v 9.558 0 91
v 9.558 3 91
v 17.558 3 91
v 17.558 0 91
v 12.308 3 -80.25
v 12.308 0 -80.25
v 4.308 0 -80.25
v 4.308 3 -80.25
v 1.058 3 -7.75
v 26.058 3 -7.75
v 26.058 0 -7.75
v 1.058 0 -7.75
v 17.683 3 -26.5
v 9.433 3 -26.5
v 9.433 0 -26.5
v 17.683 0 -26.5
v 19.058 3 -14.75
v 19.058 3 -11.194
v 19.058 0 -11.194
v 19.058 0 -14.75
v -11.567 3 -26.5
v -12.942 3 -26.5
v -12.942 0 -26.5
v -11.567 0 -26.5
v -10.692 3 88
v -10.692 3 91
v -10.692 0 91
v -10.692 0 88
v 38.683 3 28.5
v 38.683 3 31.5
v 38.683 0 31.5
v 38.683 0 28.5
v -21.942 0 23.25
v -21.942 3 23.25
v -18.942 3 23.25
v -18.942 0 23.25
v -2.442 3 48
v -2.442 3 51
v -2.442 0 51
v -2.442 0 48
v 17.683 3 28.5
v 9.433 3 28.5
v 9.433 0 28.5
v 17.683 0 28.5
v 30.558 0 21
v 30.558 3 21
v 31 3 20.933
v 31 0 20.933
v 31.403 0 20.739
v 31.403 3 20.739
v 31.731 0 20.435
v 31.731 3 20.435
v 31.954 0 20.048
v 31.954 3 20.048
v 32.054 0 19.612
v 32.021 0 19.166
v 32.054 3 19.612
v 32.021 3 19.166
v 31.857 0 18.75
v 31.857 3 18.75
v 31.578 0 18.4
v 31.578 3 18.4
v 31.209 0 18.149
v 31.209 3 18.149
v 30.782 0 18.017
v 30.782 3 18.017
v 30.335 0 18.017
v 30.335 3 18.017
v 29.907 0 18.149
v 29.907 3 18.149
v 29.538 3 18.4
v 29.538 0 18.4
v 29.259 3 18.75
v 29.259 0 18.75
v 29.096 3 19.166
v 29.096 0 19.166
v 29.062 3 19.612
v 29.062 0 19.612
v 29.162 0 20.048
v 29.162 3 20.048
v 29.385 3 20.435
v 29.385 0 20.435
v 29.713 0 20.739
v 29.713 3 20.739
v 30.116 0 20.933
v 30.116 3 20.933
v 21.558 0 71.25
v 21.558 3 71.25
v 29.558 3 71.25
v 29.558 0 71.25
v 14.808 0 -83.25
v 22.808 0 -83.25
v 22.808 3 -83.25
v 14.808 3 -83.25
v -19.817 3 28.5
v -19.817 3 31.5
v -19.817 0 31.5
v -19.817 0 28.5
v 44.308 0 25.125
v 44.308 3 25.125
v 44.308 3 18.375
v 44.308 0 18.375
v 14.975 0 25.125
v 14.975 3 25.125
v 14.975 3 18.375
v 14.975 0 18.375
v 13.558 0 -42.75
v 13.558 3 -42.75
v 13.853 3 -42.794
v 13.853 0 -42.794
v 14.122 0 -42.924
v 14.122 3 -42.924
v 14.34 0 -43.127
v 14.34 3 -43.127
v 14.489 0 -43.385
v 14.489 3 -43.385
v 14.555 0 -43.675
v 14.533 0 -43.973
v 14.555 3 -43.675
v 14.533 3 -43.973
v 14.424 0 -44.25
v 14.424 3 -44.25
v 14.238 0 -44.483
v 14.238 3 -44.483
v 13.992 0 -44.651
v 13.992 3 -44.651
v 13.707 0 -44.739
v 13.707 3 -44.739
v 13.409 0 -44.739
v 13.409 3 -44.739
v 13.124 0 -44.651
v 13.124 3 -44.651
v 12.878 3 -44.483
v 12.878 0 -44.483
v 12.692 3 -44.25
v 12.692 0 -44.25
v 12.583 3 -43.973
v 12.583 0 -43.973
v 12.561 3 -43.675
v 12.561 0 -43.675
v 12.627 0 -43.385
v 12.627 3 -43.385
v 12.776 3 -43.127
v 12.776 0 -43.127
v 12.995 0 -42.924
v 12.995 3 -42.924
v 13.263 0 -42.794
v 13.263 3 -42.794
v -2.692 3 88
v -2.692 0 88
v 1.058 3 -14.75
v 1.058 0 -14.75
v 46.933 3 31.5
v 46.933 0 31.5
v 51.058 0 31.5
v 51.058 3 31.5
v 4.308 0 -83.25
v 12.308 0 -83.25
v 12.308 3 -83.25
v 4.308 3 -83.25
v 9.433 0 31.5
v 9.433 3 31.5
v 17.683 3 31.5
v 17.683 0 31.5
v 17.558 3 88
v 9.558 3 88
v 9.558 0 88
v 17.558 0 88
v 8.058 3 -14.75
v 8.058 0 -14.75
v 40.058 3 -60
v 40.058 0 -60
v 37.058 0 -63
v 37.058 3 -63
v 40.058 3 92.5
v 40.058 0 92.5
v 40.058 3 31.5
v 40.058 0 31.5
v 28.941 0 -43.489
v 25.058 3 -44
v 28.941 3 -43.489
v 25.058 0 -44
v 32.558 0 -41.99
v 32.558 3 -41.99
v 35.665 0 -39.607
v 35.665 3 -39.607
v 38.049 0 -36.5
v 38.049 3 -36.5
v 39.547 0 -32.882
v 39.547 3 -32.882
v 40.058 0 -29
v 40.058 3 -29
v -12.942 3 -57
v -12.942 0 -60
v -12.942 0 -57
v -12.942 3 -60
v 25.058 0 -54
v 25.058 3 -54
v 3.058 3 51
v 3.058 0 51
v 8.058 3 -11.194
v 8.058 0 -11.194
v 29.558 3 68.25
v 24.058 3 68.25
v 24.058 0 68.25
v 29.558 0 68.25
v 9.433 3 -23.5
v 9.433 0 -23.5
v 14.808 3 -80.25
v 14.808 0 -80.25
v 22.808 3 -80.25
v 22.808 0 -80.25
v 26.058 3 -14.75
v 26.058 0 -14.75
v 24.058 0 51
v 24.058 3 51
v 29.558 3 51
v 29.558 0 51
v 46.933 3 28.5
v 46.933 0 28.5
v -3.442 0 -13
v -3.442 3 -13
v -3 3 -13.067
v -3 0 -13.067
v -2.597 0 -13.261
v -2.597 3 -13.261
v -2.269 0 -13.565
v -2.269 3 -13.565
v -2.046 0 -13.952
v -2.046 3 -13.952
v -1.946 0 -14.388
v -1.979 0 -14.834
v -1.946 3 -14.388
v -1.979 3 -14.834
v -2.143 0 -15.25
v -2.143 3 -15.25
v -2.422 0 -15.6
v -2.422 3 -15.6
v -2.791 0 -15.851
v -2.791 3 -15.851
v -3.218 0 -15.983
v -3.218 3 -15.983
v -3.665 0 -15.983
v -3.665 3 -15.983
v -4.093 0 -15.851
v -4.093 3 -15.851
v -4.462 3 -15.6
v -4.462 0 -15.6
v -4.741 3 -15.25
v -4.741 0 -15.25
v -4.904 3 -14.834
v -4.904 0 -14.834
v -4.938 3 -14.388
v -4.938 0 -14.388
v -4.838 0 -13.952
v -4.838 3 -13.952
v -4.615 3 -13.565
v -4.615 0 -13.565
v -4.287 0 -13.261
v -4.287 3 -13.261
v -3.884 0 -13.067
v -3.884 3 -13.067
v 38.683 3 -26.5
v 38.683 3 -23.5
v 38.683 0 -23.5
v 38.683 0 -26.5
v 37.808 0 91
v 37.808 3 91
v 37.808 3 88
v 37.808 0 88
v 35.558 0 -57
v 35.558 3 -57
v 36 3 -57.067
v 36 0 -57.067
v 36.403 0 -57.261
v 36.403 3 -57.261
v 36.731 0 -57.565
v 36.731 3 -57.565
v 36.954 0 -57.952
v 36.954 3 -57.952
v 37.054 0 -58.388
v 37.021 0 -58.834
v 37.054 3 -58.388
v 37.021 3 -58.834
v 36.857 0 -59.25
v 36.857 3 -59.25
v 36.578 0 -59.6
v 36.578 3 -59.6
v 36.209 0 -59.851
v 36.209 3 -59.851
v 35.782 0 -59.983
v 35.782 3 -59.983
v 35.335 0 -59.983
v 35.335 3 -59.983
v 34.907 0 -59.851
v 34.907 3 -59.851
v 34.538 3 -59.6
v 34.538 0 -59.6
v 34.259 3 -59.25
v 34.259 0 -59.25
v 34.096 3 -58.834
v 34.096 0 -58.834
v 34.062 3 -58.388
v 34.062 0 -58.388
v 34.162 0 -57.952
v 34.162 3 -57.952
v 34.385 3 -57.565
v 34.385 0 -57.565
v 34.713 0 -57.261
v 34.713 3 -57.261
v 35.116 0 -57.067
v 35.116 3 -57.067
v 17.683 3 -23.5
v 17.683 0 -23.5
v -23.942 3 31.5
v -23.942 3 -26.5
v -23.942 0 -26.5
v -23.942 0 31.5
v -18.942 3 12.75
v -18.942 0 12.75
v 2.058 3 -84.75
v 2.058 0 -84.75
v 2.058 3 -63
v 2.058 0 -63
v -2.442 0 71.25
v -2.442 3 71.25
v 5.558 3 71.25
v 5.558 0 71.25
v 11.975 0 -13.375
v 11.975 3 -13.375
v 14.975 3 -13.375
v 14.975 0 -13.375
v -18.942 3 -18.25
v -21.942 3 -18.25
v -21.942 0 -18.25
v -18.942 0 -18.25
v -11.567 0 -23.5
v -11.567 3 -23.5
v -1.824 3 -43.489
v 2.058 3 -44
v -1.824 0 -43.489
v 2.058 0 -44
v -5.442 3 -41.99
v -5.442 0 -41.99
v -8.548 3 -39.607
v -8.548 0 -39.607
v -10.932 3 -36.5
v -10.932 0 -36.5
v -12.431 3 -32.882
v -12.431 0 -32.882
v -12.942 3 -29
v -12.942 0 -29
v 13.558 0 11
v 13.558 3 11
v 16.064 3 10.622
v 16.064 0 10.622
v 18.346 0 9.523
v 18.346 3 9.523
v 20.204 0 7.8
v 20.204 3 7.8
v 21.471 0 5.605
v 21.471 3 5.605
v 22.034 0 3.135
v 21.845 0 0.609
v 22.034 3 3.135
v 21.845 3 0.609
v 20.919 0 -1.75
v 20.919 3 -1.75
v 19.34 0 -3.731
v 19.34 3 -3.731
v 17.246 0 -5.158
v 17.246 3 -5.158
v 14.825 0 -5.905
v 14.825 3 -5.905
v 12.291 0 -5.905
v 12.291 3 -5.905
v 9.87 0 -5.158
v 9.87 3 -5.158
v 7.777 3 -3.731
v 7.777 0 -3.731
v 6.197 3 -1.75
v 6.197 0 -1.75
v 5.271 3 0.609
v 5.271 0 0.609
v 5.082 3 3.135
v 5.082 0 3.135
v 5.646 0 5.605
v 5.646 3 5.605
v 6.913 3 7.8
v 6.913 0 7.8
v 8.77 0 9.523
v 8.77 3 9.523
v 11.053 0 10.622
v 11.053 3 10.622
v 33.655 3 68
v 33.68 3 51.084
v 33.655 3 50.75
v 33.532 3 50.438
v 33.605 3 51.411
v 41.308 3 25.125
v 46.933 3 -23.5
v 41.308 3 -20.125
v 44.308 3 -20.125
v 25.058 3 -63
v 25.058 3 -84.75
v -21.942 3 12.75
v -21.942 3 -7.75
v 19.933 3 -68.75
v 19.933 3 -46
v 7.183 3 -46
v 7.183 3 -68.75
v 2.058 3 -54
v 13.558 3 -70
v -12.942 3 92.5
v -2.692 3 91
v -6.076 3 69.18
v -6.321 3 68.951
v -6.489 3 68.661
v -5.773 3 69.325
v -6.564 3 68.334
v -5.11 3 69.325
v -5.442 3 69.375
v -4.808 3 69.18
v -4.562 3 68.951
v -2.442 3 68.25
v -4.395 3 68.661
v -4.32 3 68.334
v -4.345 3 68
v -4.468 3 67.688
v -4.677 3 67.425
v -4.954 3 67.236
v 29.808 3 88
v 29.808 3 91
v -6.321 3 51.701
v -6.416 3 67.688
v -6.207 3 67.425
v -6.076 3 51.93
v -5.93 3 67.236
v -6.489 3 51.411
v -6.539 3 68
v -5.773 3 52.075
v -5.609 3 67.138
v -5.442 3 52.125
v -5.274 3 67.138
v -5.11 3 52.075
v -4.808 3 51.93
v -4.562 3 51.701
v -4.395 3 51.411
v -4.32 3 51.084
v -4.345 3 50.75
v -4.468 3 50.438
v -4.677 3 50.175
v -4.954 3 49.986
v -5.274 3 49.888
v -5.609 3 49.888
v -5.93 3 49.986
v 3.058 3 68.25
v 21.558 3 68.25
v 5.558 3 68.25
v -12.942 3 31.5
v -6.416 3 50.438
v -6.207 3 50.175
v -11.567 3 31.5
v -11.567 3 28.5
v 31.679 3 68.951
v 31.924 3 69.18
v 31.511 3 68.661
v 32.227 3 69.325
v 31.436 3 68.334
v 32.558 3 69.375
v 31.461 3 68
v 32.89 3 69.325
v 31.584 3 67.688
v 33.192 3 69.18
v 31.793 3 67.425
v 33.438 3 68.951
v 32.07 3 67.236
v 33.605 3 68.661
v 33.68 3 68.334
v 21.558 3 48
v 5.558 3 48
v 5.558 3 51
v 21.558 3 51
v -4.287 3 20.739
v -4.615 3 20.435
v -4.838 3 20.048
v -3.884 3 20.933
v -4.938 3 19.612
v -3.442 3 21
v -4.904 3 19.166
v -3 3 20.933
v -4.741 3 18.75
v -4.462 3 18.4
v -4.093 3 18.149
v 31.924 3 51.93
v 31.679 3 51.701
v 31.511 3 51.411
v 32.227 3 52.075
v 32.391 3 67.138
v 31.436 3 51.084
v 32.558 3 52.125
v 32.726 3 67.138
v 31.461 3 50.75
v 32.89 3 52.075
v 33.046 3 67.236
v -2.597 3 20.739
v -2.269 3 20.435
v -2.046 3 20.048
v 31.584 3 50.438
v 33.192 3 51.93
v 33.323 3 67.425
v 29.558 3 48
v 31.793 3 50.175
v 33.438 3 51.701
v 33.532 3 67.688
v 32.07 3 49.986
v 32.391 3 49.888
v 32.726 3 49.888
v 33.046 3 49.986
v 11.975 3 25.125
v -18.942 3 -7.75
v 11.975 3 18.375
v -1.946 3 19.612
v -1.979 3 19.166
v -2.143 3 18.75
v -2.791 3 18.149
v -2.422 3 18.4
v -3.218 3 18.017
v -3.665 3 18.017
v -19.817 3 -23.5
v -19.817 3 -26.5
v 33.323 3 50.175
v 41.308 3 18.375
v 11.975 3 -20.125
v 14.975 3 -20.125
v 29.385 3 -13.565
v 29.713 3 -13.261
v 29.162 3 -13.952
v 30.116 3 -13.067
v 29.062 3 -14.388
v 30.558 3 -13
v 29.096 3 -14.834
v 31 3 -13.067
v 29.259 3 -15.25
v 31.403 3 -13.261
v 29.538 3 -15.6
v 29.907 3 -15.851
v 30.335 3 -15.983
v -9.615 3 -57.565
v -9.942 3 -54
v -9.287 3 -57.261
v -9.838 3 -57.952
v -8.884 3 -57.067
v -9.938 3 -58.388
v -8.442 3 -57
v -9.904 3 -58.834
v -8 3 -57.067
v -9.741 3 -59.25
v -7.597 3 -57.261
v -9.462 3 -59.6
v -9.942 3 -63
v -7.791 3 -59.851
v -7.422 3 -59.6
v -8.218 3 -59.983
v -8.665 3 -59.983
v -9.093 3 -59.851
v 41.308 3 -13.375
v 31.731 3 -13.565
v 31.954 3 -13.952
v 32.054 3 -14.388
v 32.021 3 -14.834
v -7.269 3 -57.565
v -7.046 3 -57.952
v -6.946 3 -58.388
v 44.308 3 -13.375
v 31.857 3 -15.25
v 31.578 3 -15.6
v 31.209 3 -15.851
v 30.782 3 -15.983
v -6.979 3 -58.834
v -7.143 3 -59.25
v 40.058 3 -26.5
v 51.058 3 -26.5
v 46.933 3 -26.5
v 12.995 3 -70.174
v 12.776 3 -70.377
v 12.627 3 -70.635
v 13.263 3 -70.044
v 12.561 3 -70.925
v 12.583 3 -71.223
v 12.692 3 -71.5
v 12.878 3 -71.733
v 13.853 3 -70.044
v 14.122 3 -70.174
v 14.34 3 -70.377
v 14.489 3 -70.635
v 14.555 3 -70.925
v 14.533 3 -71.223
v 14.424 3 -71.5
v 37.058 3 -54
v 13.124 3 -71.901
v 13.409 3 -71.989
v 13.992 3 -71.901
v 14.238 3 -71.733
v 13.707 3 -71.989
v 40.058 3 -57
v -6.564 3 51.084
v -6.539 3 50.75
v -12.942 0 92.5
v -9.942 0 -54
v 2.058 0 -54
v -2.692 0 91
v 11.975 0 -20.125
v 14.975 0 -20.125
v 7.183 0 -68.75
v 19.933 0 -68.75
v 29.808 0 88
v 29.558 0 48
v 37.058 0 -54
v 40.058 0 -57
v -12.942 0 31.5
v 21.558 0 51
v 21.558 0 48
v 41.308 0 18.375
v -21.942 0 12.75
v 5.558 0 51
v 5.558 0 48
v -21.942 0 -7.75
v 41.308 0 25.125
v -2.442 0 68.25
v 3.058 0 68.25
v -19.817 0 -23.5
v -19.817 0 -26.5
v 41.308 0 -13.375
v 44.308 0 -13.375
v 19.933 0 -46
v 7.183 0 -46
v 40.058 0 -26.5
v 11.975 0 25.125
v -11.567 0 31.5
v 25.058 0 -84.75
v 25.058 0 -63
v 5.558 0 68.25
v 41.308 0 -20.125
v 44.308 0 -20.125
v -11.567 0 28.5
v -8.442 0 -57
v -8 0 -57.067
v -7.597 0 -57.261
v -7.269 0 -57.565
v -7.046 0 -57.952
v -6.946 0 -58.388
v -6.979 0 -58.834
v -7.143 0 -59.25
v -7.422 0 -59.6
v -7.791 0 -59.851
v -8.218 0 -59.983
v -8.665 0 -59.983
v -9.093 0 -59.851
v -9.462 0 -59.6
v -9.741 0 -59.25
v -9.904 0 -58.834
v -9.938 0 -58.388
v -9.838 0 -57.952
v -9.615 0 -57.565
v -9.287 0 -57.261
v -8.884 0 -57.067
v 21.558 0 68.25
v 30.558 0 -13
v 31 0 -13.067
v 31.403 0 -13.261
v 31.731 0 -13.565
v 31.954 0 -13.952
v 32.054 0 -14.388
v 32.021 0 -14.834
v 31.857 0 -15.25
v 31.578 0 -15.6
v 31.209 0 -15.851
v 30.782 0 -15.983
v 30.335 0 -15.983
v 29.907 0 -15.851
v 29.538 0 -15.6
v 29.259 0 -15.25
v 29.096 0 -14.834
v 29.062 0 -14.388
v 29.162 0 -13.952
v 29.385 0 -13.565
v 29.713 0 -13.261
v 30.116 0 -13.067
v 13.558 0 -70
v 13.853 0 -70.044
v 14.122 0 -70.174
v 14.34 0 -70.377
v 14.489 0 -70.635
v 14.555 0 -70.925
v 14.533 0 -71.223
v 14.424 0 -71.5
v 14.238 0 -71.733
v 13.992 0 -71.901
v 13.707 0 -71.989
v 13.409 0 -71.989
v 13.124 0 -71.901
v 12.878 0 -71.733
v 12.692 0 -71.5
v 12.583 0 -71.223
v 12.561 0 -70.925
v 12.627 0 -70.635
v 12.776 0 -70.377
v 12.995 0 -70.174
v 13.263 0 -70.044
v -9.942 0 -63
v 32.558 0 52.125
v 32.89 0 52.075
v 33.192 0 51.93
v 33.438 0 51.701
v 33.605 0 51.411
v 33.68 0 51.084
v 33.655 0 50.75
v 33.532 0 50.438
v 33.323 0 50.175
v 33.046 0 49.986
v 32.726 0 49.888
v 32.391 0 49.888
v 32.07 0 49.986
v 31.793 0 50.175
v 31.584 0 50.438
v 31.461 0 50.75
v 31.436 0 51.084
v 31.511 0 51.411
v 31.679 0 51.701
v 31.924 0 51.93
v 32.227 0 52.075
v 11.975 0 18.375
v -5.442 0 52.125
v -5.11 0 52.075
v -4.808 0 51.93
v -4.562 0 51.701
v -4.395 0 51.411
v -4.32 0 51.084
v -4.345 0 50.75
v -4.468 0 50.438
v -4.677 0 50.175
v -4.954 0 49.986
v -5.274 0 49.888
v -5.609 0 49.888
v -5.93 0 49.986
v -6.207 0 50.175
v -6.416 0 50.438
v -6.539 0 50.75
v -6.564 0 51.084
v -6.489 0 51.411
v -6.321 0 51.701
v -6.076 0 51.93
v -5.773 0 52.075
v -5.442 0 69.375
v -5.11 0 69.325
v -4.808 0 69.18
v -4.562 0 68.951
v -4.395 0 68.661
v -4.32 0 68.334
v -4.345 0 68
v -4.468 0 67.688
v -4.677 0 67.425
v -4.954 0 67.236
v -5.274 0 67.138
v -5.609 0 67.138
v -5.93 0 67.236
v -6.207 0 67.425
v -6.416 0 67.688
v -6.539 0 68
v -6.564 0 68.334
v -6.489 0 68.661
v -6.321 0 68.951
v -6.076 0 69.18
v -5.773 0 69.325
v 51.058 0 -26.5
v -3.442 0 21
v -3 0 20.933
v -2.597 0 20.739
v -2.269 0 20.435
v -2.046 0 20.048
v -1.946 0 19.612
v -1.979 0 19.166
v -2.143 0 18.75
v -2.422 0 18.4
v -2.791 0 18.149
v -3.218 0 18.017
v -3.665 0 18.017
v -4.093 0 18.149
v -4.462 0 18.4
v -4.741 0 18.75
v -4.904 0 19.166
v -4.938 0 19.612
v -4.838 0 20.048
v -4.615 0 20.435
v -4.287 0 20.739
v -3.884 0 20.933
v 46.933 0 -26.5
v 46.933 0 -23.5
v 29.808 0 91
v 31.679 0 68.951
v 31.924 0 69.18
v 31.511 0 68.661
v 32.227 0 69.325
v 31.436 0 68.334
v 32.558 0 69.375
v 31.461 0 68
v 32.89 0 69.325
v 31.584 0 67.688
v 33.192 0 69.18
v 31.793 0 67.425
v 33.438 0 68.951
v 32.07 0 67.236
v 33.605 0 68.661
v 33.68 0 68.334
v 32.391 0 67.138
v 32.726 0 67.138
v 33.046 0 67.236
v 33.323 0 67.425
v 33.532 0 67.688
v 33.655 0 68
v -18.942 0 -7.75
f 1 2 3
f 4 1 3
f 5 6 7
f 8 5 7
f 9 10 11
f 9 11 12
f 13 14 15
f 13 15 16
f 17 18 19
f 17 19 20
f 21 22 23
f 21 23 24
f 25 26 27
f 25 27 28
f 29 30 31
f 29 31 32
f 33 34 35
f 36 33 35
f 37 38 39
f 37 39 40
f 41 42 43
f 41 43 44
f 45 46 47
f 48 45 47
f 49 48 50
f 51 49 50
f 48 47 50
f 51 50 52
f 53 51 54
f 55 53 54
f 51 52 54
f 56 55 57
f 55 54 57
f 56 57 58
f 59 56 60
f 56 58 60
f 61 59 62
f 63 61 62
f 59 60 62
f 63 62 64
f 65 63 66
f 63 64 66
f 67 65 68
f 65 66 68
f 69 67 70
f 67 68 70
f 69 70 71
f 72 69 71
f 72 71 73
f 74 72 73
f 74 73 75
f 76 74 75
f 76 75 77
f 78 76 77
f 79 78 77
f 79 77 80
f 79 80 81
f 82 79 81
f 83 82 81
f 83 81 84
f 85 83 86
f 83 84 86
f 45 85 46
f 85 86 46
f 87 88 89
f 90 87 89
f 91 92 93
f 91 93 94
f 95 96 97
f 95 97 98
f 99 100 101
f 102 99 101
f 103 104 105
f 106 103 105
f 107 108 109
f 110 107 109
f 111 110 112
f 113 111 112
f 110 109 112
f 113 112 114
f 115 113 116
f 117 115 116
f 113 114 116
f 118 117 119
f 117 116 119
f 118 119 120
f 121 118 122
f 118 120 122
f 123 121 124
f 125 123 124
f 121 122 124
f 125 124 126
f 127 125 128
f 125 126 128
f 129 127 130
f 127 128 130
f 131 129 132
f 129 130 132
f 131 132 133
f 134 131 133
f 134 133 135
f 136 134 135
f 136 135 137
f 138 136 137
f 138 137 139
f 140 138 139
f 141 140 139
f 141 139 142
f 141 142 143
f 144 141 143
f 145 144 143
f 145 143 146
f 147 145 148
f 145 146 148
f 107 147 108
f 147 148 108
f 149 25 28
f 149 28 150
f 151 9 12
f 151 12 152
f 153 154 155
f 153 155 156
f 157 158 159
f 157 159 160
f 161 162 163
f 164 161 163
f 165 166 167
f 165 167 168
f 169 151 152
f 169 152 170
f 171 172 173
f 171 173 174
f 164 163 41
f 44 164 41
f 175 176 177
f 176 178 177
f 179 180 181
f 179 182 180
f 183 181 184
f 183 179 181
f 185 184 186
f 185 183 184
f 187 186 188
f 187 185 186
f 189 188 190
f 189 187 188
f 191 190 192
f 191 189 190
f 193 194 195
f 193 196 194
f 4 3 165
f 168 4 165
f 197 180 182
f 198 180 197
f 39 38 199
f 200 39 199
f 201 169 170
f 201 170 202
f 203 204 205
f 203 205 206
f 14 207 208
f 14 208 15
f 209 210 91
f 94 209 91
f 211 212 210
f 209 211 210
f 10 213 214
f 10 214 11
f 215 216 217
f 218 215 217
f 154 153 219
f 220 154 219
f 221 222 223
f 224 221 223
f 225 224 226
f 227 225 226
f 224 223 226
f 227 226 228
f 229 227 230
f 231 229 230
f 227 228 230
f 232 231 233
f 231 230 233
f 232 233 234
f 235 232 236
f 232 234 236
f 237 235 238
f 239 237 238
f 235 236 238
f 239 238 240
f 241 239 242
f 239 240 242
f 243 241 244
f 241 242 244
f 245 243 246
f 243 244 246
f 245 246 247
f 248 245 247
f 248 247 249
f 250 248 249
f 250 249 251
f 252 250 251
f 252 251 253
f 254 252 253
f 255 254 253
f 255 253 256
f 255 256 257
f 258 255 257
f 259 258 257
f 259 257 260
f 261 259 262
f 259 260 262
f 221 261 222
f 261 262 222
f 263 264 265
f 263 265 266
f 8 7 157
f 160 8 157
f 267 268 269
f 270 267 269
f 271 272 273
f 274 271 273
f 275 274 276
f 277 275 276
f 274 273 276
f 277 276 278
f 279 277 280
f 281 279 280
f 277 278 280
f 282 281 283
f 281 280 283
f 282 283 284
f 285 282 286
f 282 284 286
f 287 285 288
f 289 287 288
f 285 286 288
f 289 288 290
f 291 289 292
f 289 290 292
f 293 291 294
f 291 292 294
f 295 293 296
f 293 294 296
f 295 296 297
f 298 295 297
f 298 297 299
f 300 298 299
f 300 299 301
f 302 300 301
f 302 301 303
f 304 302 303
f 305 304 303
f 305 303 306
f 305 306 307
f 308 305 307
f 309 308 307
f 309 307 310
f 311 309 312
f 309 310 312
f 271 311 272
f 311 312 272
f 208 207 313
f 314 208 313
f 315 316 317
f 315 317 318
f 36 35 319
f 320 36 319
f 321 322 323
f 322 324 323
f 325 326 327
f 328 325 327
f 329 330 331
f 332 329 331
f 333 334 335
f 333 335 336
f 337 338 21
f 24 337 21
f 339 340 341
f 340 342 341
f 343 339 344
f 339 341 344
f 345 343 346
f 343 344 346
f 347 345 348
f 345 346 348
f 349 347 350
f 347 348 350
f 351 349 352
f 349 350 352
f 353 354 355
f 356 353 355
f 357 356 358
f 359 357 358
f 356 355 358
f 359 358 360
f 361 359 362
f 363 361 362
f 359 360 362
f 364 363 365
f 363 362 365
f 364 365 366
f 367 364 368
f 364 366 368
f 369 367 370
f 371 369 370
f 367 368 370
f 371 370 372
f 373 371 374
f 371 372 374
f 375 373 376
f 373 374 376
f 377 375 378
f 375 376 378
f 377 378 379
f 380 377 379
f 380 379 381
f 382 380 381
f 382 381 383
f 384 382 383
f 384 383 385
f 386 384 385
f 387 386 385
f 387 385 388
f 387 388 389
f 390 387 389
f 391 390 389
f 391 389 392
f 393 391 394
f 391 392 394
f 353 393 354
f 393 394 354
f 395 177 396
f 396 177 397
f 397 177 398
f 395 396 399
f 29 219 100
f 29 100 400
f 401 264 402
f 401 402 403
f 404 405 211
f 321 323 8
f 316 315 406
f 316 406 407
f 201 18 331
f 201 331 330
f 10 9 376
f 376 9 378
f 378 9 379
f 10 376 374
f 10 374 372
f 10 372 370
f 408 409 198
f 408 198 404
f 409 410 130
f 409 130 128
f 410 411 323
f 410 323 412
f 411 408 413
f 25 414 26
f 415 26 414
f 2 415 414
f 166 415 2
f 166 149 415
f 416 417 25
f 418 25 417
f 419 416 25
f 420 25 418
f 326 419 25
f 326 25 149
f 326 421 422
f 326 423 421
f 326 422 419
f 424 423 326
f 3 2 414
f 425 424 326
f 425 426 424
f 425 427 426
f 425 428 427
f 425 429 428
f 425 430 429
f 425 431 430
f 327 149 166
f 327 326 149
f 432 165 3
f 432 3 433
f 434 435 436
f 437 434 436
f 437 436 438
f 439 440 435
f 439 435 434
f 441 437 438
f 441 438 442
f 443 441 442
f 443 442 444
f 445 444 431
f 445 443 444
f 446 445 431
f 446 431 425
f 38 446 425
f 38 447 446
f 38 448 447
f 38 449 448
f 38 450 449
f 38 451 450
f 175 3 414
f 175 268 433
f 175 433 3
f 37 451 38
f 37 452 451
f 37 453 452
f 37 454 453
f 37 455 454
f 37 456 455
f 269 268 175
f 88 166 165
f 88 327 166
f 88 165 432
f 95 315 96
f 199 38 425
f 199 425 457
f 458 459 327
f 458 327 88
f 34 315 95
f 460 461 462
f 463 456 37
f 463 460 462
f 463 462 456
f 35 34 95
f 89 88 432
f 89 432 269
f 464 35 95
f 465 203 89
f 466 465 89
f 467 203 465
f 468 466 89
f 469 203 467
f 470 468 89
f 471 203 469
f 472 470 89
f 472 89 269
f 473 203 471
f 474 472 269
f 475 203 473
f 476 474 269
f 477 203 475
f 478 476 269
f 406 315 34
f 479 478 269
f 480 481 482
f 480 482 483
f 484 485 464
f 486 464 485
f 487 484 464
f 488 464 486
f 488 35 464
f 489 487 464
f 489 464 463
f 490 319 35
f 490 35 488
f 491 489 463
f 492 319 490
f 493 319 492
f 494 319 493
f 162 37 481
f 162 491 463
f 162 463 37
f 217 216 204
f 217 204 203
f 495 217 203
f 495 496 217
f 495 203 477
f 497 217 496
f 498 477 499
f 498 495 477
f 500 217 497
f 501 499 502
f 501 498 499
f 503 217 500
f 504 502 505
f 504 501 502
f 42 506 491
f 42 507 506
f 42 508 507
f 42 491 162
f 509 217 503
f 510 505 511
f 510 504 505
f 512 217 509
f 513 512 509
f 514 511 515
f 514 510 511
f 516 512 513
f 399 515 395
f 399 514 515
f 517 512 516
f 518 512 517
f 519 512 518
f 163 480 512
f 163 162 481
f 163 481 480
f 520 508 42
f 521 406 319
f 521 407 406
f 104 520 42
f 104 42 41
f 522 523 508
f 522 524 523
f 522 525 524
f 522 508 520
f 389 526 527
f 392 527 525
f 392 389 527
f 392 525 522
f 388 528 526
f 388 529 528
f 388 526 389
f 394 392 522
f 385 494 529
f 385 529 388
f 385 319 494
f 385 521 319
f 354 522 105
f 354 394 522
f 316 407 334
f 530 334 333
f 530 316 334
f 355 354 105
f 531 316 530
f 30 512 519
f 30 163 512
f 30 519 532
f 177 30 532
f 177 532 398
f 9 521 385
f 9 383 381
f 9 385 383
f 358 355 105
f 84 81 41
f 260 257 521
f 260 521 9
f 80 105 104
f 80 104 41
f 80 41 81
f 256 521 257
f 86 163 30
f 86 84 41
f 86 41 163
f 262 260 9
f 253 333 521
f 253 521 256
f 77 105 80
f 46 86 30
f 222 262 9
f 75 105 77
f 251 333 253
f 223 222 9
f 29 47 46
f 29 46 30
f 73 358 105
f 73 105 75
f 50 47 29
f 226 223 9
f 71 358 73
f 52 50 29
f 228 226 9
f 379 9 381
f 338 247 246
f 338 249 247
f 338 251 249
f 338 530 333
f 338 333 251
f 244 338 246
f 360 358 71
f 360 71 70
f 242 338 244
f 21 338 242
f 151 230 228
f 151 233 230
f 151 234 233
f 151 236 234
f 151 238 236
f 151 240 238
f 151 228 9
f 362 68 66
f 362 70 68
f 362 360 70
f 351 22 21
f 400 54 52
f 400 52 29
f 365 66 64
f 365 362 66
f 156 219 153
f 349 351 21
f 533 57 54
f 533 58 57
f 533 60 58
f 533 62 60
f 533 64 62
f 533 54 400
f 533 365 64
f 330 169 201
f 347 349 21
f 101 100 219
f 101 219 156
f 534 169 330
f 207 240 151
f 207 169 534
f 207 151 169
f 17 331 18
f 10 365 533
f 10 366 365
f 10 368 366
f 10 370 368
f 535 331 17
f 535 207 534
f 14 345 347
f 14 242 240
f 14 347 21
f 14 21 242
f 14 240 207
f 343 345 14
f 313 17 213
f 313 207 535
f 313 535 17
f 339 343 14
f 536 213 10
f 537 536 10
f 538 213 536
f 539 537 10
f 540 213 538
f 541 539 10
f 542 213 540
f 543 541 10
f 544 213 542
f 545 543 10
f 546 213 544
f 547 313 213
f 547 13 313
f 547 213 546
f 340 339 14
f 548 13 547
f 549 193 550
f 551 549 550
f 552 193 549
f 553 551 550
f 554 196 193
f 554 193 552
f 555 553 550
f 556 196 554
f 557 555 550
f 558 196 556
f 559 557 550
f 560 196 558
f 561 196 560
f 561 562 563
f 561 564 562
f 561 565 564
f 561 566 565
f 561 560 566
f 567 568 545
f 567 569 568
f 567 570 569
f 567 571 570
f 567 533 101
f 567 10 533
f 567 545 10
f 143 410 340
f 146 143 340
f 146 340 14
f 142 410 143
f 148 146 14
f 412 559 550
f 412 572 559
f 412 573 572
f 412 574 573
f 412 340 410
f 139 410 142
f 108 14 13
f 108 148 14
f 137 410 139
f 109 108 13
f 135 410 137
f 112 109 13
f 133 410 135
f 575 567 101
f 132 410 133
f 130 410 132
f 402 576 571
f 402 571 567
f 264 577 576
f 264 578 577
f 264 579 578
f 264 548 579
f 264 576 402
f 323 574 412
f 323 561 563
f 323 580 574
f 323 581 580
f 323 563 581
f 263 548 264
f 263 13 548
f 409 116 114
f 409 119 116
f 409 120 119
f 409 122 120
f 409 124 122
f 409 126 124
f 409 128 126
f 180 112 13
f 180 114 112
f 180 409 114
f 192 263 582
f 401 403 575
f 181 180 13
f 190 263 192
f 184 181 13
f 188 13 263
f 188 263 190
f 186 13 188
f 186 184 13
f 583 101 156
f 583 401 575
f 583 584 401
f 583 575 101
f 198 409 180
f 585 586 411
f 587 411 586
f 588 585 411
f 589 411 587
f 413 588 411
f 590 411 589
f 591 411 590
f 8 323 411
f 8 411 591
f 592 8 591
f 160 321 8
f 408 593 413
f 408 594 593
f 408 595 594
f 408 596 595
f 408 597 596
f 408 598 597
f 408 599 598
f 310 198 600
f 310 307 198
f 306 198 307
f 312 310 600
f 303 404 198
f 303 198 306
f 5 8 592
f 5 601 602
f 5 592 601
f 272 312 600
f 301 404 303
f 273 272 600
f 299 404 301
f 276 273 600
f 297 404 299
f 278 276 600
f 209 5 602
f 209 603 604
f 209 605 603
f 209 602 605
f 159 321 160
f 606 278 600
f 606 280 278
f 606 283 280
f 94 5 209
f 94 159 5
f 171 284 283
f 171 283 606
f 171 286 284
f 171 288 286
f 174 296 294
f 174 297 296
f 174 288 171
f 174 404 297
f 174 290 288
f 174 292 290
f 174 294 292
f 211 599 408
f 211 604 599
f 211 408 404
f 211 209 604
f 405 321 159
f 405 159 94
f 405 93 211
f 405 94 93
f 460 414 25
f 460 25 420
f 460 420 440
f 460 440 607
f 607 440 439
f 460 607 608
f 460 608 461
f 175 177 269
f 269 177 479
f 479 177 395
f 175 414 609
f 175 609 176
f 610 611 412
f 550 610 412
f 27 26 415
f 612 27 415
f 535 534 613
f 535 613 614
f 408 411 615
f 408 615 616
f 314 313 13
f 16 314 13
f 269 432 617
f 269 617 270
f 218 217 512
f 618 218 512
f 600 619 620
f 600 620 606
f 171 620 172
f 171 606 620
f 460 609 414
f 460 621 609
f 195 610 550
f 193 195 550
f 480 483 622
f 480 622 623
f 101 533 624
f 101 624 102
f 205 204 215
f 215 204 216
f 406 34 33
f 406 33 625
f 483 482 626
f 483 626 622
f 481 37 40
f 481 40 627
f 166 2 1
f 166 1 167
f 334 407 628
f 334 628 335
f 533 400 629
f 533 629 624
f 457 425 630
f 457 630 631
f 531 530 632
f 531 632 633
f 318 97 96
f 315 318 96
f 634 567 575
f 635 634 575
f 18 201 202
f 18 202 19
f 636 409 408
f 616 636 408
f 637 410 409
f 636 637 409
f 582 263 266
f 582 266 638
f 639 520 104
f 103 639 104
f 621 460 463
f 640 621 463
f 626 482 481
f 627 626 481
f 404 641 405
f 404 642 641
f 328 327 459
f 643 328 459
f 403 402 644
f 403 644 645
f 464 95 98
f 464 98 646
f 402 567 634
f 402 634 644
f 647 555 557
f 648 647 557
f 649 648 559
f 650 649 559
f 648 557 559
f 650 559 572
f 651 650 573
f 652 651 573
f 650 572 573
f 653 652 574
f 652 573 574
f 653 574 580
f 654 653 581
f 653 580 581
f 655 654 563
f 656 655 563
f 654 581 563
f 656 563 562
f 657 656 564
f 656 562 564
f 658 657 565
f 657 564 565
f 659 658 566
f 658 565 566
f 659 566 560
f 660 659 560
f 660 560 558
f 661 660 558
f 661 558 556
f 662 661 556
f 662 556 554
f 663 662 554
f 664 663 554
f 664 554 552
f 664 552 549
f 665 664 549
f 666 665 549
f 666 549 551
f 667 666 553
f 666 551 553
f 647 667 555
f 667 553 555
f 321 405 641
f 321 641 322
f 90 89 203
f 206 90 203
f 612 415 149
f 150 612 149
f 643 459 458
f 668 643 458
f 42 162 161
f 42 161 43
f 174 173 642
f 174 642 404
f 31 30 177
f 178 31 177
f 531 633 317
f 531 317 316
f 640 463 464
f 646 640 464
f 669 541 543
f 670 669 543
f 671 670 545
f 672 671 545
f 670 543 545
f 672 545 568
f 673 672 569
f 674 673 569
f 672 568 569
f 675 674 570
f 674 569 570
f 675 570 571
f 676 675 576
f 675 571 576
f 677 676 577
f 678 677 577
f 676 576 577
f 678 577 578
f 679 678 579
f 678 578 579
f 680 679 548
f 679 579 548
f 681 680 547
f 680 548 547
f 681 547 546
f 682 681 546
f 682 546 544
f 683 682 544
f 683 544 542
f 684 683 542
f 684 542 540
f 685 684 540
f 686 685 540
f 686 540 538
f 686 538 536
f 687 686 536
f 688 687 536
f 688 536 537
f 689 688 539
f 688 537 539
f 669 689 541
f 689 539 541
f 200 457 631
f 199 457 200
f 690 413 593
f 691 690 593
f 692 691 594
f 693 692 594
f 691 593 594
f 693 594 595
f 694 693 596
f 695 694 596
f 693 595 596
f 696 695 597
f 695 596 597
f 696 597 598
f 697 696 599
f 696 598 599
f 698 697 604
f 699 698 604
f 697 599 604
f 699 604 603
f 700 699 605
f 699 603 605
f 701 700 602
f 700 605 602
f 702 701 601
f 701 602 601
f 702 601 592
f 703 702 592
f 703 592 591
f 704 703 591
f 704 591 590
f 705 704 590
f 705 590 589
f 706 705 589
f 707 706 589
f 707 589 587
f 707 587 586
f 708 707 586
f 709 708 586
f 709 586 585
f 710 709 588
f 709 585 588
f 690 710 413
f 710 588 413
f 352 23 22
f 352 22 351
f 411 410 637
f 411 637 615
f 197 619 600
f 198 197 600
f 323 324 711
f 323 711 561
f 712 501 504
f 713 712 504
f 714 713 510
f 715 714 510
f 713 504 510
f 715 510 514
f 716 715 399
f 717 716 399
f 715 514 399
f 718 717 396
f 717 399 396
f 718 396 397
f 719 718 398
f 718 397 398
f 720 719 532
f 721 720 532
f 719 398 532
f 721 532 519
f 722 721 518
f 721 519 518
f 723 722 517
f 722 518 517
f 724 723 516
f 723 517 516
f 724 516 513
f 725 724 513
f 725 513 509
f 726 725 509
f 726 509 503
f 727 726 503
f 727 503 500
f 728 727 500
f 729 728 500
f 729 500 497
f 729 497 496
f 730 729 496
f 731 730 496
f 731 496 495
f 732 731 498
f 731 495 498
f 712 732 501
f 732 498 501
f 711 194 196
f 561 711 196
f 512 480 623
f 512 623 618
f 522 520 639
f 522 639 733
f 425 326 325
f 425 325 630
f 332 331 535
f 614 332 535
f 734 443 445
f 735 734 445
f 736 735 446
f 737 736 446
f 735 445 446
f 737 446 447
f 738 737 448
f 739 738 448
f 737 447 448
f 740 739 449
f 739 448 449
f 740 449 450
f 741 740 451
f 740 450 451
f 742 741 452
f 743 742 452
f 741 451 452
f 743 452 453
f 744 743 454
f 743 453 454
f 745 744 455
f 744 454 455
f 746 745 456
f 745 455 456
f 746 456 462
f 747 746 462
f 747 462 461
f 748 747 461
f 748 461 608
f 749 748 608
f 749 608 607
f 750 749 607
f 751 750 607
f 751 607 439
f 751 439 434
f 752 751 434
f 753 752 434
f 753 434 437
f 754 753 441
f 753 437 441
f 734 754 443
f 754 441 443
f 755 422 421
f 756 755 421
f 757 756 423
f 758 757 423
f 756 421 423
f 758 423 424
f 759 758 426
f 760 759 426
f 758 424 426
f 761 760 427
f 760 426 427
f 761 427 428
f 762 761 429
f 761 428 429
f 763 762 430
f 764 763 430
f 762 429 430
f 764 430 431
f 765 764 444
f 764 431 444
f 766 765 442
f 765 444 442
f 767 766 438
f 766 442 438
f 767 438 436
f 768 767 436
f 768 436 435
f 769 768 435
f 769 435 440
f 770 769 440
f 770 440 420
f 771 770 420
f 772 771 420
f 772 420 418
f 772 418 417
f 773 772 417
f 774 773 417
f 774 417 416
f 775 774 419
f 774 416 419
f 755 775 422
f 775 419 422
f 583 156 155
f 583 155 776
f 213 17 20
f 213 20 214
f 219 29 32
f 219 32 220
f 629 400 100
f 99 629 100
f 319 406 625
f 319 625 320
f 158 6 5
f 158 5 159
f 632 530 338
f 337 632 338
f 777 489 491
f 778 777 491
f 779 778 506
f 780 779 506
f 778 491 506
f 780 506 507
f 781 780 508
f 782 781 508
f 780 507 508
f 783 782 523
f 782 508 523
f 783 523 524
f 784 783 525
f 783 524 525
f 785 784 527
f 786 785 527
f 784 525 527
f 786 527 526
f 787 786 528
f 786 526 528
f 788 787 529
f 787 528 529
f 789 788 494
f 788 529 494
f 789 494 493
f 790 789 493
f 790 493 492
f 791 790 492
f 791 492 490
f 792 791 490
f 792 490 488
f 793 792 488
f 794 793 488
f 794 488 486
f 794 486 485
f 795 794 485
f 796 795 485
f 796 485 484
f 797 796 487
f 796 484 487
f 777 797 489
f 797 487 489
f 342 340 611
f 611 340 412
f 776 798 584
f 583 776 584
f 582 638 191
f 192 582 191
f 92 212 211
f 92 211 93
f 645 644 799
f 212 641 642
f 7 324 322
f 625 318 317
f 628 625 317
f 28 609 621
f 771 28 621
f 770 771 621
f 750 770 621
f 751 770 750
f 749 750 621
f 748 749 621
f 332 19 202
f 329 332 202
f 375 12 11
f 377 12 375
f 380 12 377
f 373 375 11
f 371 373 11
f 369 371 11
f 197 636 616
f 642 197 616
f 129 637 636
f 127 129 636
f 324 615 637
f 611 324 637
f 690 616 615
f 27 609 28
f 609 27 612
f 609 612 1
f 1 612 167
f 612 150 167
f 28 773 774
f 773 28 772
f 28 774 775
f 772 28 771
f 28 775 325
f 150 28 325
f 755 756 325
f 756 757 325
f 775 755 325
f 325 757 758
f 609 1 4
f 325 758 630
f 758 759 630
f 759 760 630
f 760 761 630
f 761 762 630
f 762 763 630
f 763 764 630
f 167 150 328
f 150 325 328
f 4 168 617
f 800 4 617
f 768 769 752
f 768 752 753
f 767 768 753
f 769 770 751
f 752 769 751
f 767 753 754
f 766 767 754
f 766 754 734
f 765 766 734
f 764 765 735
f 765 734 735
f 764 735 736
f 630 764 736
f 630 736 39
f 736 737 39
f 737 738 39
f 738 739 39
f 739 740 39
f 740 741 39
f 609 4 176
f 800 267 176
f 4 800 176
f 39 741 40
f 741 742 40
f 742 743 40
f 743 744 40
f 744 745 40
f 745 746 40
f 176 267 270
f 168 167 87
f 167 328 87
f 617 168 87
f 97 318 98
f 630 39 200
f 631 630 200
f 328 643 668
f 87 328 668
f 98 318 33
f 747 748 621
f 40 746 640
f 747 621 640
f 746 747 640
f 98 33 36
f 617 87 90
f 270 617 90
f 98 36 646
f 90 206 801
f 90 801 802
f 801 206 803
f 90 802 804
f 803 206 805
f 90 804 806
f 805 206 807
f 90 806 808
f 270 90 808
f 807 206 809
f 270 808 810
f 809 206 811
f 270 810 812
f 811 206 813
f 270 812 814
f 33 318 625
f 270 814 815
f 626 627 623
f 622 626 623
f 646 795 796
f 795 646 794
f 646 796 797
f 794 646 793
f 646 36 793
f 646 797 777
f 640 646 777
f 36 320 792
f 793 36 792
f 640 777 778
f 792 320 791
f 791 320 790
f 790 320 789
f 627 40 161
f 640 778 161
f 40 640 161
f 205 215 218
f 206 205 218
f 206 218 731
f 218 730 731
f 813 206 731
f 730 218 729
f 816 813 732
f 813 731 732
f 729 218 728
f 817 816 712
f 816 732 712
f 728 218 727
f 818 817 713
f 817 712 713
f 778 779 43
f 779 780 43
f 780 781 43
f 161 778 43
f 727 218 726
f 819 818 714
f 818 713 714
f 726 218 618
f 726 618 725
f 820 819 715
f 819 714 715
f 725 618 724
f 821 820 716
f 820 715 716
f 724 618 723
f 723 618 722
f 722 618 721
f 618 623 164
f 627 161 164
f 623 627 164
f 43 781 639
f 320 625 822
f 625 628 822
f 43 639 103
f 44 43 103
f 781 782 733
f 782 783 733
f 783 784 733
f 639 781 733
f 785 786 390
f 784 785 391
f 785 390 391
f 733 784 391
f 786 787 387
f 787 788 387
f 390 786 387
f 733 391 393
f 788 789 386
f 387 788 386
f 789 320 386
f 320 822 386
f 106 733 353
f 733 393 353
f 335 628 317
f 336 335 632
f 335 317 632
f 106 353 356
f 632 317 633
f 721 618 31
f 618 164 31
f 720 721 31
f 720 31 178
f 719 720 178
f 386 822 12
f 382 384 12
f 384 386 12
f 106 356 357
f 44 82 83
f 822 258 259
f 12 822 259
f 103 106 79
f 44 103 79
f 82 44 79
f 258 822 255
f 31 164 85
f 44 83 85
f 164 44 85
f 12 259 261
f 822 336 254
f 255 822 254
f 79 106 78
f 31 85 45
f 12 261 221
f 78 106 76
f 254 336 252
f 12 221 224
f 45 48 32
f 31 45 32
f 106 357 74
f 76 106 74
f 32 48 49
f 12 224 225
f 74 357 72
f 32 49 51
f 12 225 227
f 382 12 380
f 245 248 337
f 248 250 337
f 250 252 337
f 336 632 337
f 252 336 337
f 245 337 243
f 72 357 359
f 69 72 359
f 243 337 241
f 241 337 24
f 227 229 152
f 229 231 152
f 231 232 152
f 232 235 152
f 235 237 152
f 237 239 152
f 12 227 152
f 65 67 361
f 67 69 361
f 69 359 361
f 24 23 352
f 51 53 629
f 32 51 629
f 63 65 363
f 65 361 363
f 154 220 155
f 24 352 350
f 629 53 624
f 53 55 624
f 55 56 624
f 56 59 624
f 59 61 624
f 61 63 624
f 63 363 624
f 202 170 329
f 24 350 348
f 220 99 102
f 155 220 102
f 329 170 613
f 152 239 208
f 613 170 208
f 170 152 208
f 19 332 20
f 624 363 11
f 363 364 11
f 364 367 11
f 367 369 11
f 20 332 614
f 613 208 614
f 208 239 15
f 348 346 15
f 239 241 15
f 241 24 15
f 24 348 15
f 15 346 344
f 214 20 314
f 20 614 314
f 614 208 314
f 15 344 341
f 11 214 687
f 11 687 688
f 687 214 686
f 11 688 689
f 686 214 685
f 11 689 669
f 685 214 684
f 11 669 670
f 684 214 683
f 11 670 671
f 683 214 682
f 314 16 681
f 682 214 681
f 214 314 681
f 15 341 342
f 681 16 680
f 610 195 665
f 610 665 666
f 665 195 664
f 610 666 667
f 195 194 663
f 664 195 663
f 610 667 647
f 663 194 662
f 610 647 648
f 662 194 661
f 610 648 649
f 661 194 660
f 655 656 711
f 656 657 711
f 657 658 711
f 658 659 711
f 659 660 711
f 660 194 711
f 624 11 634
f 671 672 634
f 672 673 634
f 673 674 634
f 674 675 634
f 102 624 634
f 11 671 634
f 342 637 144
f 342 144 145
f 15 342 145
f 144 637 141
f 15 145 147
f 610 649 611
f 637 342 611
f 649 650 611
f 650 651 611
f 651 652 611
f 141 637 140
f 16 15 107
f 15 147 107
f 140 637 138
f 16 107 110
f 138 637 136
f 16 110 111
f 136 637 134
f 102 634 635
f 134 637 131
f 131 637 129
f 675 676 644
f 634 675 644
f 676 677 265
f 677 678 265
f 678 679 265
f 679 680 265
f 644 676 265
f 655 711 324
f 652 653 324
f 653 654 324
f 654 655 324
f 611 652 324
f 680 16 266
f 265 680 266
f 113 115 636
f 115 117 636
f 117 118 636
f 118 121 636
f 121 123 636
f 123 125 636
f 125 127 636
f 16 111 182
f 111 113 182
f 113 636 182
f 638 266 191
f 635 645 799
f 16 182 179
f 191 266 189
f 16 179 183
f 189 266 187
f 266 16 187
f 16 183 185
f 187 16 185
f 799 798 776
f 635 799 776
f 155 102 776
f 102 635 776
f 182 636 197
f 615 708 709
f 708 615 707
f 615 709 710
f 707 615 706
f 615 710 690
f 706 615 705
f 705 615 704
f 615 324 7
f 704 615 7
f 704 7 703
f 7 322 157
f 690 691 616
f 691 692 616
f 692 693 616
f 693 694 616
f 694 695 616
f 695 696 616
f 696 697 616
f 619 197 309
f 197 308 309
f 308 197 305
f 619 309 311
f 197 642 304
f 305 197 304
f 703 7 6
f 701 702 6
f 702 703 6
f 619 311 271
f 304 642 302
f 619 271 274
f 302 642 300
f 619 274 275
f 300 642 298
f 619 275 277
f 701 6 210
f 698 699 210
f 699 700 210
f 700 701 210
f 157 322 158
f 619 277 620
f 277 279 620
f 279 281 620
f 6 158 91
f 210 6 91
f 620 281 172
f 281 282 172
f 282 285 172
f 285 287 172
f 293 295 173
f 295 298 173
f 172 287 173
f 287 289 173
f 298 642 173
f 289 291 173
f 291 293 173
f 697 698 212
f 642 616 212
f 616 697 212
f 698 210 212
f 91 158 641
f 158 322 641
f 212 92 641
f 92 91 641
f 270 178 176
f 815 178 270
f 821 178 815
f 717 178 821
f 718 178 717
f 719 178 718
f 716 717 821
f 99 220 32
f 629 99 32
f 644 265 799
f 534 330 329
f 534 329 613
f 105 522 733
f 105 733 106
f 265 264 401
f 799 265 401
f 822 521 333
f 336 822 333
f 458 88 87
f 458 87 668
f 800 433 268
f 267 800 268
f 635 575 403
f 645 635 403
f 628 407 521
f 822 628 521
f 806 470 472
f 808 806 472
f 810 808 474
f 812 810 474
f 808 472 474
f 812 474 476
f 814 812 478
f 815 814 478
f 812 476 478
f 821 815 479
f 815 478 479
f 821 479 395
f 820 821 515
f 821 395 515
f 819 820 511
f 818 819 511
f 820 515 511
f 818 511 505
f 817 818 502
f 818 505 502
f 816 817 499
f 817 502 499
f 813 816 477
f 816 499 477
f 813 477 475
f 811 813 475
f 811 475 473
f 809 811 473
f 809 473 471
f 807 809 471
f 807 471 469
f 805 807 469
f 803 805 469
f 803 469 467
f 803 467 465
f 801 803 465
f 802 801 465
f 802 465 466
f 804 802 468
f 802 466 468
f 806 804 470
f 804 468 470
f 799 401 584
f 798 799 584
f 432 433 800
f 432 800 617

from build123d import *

# Parameters (mm, degrees)
SKETCH1_W            = 53
SKETCH1_H            = 153
BOSS_EXTRUDE1_DEPTH  = 3
SKETCH2_R            = 1.125
CUT_EXTRUDE1_DEPTH   = 3
SKETCH4_W            = 58
SKETCH4_H            = 3
BOSS_EXTRUDE3_DEPTH  = 4.5
SKETCH5_W            = 58
SKETCH5_H            = 3
BOSS_EXTRUDE4_DEPTH  = 4.5
SKETCH8_W            = 15
SKETCH8_H            = 13.5
CUT_EXTRUDE3_DEPTH   = 3
SKETCH9_W            = 6
SKETCH9_H            = 9
CUT_EXTRUDE4_DEPTH   = 3
SKETCH10_W           = 15
SKETCH10_H           = 10
CUT_EXTRUDE5_DEPTH   = 3
SKETCH11_W           = 12.75
SKETCH11_H           = 22.75
CUT_EXTRUDE6_DEPTH   = 3
SKETCH12_R           = 1
CUT_EXTRUDE7_DEPTH   = 3
SKETCH17_W           = 9
SKETCH17_H           = 3
BOSS_EXTRUDE6_DEPTH  = 6
SKETCH18_W           = 9
SKETCH18_H           = 3
BOSS_EXTRUDE8_DEPTH  = 6
SKETCH19_R           = 1.5
CUT_EXTRUDE11_DEPTH  = 3
SKETCH20_W           = 58
SKETCH20_H           = 3
BOSS_EXTRUDE9_DEPTH  = 6.5
SKETCH21_W           = 58
SKETCH21_H           = 3
BOSS_EXTRUDE10_DEPTH = 6.5
SKETCH29_W           = 8
SKETCH29_H           = 3
CUT_EXTRUDE15_DEPTH  = 3
SKETCH33_W           = 21
SKETCH33_H           = 17.25
CUT_EXTRUDE20_DEPTH  = 3
CHAMFER1_SIZE        = 3
CHAMFER2_SIZE        = 3
CHAMFER3_SIZE        = 3
CHAMFER4_SIZE        = 3
SKETCH34_W           = 8.25
SKETCH34_H           = 3
CUT_EXTRUDE21_DEPTH  = 3
SKETCH35_W           = 3
SKETCH35_H           = 6.75
CUT_EXTRUDE22_DEPTH  = 3
SKETCH36_W           = 3
SKETCH36_H           = 6.75
CUT_EXTRUDE23_DEPTH  = 3
SKETCH37_W           = 3
SKETCH37_H           = 10.5
CUT_EXTRUDE24_DEPTH  = 3
FILLET1_R            = 15
FILLET2_R            = 15
SKETCH38_W           = 23
SKETCH38_H           = 3
BOSS_EXTRUDE12_DEPTH = 8.25
SKETCH39_W           = 8
SKETCH39_H           = 3
CUT_EXTRUDE25_DEPTH  = 3
SKETCH40_W           = 53
SKETCH40_H           = 3
BOSS_EXTRUDE13_DEPTH = 16
SKETCH41_W           = 8
SKETCH41_H           = 3
CUT_EXTRUDE26_DEPTH  = 3
SKETCH42_R           = 8.5
SKETCH42_R_2         = 1.5
CUT_EXTRUDE30_DEPTH  = 3


with BuildPart() as part:
    # Sketch1 → Boss-Extrude1 (new body)
    with BuildSketch(Plane(origin=(0, 0, 0), x_dir=(1, 0, 0), z_dir=(0, 1, 0))):
        with Locations((13.558181818, 0)):
            Rectangle(SKETCH1_W, SKETCH1_H)
    extrude(amount=BOSS_EXTRUDE1_DEPTH)

    # Sketch2 → Cut-Extrude1 (cut)
    with BuildSketch(Plane(origin=(0, 3, 0), x_dir=(1, 0, 0), z_dir=(0, 1, 0))):
        with Locations(Location((-5.441818182, -68.25, 0), (0, 0, 270))):
            Circle(SKETCH2_R)
        with Locations(Location((-5.441818182, -51, 0), (0, 0, 270))):
            Circle(SKETCH2_R)
        with Locations(Location((32.558181818, -68.25, 0), (0, 0, 270))):
            Circle(SKETCH2_R)
        with Locations(Location((32.558181818, -51, 0), (0, 0, 270))):
            Circle(SKETCH2_R)
    extrude(amount=-CUT_EXTRUDE1_DEPTH, mode=Mode.SUBTRACT)

    # Sketch4 → Boss-Extrude3 (add)
    with BuildSketch(Plane(origin=(40.058181818, 0, 0), x_dir=(0, 0, -1), z_dir=(1, 0, 0))):
        with Locations((-2.5, 1.5)):
            Rectangle(SKETCH4_W, SKETCH4_H)
    extrude(amount=BOSS_EXTRUDE3_DEPTH)

    # Sketch5 → Boss-Extrude4 (add)
    with BuildSketch(Plane.ZY.offset(12.941818182)):
        with Locations((2.5, 1.5)):
            Rectangle(SKETCH5_W, SKETCH5_H)
    extrude(amount=BOSS_EXTRUDE4_DEPTH)

    # Sketch8 → Cut-Extrude3 (cut)
    with BuildSketch(Plane(origin=(0, 3, 0), x_dir=(1, 0, 0), z_dir=(0, 1, 0))):
        with Locations((-5.441818182, 69.75)):
            Rectangle(SKETCH8_W, SKETCH8_H)
        with Locations((32.558181818, 69.75)):
            Rectangle(SKETCH8_W, SKETCH8_H)
    extrude(amount=-CUT_EXTRUDE3_DEPTH, mode=Mode.SUBTRACT)

    # Sketch9 → Cut-Extrude4 (cut)
    with BuildSketch(Plane(origin=(0, 3, 0), x_dir=(1, 0, 0), z_dir=(0, 1, 0))):
        with Locations((-9.941818182, 58.5)):
            Rectangle(SKETCH9_W, SKETCH9_H)
        with Locations((37.058181818, 58.5)):
            Rectangle(SKETCH9_W, SKETCH9_H)
    extrude(amount=-CUT_EXTRUDE4_DEPTH, mode=Mode.SUBTRACT)

    # Sketch10 → Cut-Extrude5 (cut)
    with BuildSketch(Plane(origin=(0, 3, 0), x_dir=(1, 0, 0), z_dir=(0, 1, 0))):
        with Locations((-5.441818182, 49)):
            Rectangle(SKETCH10_W, SKETCH10_H)
        with Locations((32.558181818, 49)):
            Rectangle(SKETCH10_W, SKETCH10_H)
    extrude(amount=-CUT_EXTRUDE5_DEPTH, mode=Mode.SUBTRACT)

    # Sketch11 → Cut-Extrude6 (cut)
    with BuildSketch(Plane(origin=(0, 3, 0), x_dir=(1, 0, 0), z_dir=(0, 1, 0))):
        with Locations((13.558181818, 57.375)):
            Rectangle(SKETCH11_W, SKETCH11_H)
    extrude(amount=-CUT_EXTRUDE6_DEPTH, mode=Mode.SUBTRACT)

    # Sketch12 → Cut-Extrude7 (cut)
    with BuildSketch(Plane(origin=(0, 3, 0), x_dir=(1, 0, 0), z_dir=(0, 1, 0))):
        with Locations(Location((13.558181818, 71, 0), (0, 0, 270))):
            Circle(SKETCH12_R)
        with Locations(Location((13.558181818, 43.75, 0), (0, 0, 270))):
            Circle(SKETCH12_R)
    extrude(amount=-CUT_EXTRUDE7_DEPTH, mode=Mode.SUBTRACT)

    # Sketch17 → Boss-Extrude6 (add)
    with BuildSketch(Plane.ZY.offset(6.941818182)):
        with Locations((-58.5, 1.5)):
            Rectangle(SKETCH17_W, SKETCH17_H)
    extrude(amount=BOSS_EXTRUDE6_DEPTH)

    # Sketch18 → Boss-Extrude8 (add)
    with BuildSketch(Plane(origin=(34.058181818, 0, 0), x_dir=(0, 0, -1), z_dir=(1, 0, 0))):
        with Locations((58.5, 1.5)):
            Rectangle(SKETCH18_W, SKETCH18_H)
    extrude(amount=BOSS_EXTRUDE8_DEPTH)

    # Sketch19 → Cut-Extrude11 (cut)
    with BuildSketch(Plane(origin=(0, 3, 0), x_dir=(1, 0, 0), z_dir=(0, 1, 0))):
        with Locations(Location((35.558181818, 58.5, 0), (0, 0, 270))):
            Circle(SKETCH19_R)
        with Locations(Location((-8.441818182, 58.5, 0), (0, 0, 270))):
            Circle(SKETCH19_R)
    extrude(amount=-CUT_EXTRUDE11_DEPTH, mode=Mode.SUBTRACT)

    # Sketch20 → Boss-Extrude9 (add)
    with BuildSketch(Plane(origin=(44.558181818, 0, 0), x_dir=(0, 0, -1), z_dir=(1, 0, 0))):
        with Locations((-2.5, 1.5)):
            Rectangle(SKETCH20_W, SKETCH20_H)
    extrude(amount=BOSS_EXTRUDE9_DEPTH)

    # Sketch21 → Boss-Extrude10 (add)
    with BuildSketch(Plane.ZY.offset(17.441818182)):
        with Locations((2.5, 1.5)):
            Rectangle(SKETCH21_W, SKETCH21_H)
    extrude(amount=BOSS_EXTRUDE10_DEPTH)

    # Sketch29 → Cut-Extrude15 (cut)
    with BuildSketch(Plane(origin=(0, 3, 0), x_dir=(1, 0, 0), z_dir=(0, 1, 0))):
        with Locations((1.558181818, -49.5)):
            Rectangle(SKETCH29_W, SKETCH29_H)
        with Locations((1.558181818, -69.75)):
            Rectangle(SKETCH29_W, SKETCH29_H)
        with Locations((25.558181818, -49.5)):
            Rectangle(SKETCH29_W, SKETCH29_H)
        with Locations((25.558181818, -69.75)):
            Rectangle(SKETCH29_W, SKETCH29_H)
    extrude(amount=-CUT_EXTRUDE15_DEPTH, mode=Mode.SUBTRACT)

    # Sketch33 → Cut-Extrude20 (cut)
    with BuildSketch(Plane(origin=(0, 3, 0), x_dir=(1, 0, 0), z_dir=(0, 1, 0))):
        with Locations((13.558181818, -59.625)):
            Rectangle(SKETCH33_W, SKETCH33_H)
    extrude(amount=-CUT_EXTRUDE20_DEPTH, mode=Mode.SUBTRACT)

    # Chamfer1
    chamfer1_edges = [part.edges().sort_by_distance(p)[0] for p in [
        (-12.941818182, 1.5, -54),
    ]]
    chamfer(chamfer1_edges, length=CHAMFER1_SIZE)

    # Chamfer2
    chamfer2_edges = [part.edges().sort_by_distance(p)[0] for p in [
        (-12.941818182, 1.5, -63),
    ]]
    chamfer(chamfer2_edges, length=CHAMFER2_SIZE)

    # Chamfer3
    chamfer3_edges = [part.edges().sort_by_distance(p)[0] for p in [
        (40.058181818, 1.5, -54),
    ]]
    chamfer(chamfer3_edges, length=CHAMFER3_SIZE)

    # Chamfer4
    chamfer4_edges = [part.edges().sort_by_distance(p)[0] for p in [
        (40.058181818, 1.5, -63),
    ]]
    chamfer(chamfer4_edges, length=CHAMFER4_SIZE)

    # Sketch34 → Cut-Extrude21 (cut)
    with BuildSketch(Plane(origin=(0, 3, 0), x_dir=(1, 0, 0), z_dir=(0, 1, 0))):
        with Locations((-15.691818182, 25)):
            Rectangle(SKETCH34_W, SKETCH34_H)
        with Locations((42.808181818, 25)):
            Rectangle(SKETCH34_W, SKETCH34_H)
        with Locations((-15.691818182, -30)):
            Rectangle(SKETCH34_W, SKETCH34_H)
        with Locations((42.808181818, -30)):
            Rectangle(SKETCH34_W, SKETCH34_H)
        with Locations((13.558181818, -30)):
            Rectangle(SKETCH34_W, SKETCH34_H)
        with Locations((13.558181818, 25)):
            Rectangle(SKETCH34_W, SKETCH34_H)
    extrude(amount=-CUT_EXTRUDE21_DEPTH, mode=Mode.SUBTRACT)

    # Sketch35 → Cut-Extrude22 (cut)
    with BuildSketch(Plane(origin=(0, 3, 0), x_dir=(1, 0, 0), z_dir=(0, 1, 0))):
        with Locations((42.808181818, 16.75)):
            Rectangle(SKETCH35_W, SKETCH35_H)
        with Locations((42.808181818, -21.75)):
            Rectangle(SKETCH35_W, SKETCH35_H)
    extrude(amount=-CUT_EXTRUDE22_DEPTH, mode=Mode.SUBTRACT)

    # Sketch36 → Cut-Extrude23 (cut)
    with BuildSketch(Plane(origin=(0, 3, 0), x_dir=(1, 0, 0), z_dir=(0, 1, 0))):
        with Locations((13.474653765, 16.75)):
            Rectangle(SKETCH36_W, SKETCH36_H)
        with Locations((13.474653765, -21.75)):
            Rectangle(SKETCH36_W, SKETCH36_H)
    extrude(amount=-CUT_EXTRUDE23_DEPTH, mode=Mode.SUBTRACT)

    # Sketch37 → Cut-Extrude24 (cut)
    with BuildSketch(Plane(origin=(0, 3, 0), x_dir=(1, 0, 0), z_dir=(0, 1, 0))):
        with Locations((-20.441818182, 13)):
            Rectangle(SKETCH37_W, SKETCH37_H)
        with Locations((-20.441818182, -18)):
            Rectangle(SKETCH37_W, SKETCH37_H)
    extrude(amount=-CUT_EXTRUDE24_DEPTH, mode=Mode.SUBTRACT)

    # Fillet1
    fillet1_edges = [part.edges().sort_by_distance(p)[0] for p in [
        (-12.941818182, 1.5, -44),
    ]]
    fillet(fillet1_edges, radius=FILLET1_R - 0.0001)  # a hair under: the kernel refuses the full size

    # Fillet2
    fillet2_edges = [part.edges().sort_by_distance(p)[0] for p in [
        (40.058181818, 1.5, -44),
    ]]
    fillet(fillet2_edges, radius=FILLET2_R - 0.0001)  # a hair under: the kernel refuses the full size

    # Sketch38 → Boss-Extrude12 (add)
    with BuildSketch(Plane(origin=(0, 0, -76.5), x_dir=(-1, 0, 0), z_dir=(0, 0, -1))):
        with Locations((-13.558181818, 1.5)):
            Rectangle(SKETCH38_W, SKETCH38_H)
    extrude(amount=BOSS_EXTRUDE12_DEPTH)

    # Sketch39 → Cut-Extrude25 (cut)
    with BuildSketch(Plane(origin=(0, 0, 0), x_dir=(-1, 0, 0), z_dir=(0, -1, 0))):
        with Locations((-8.308181818, 81.75)):
            Rectangle(SKETCH39_W, SKETCH39_H)
        with Locations((-18.808181818, 81.75)):
            Rectangle(SKETCH39_W, SKETCH39_H)
    extrude(amount=-CUT_EXTRUDE25_DEPTH, mode=Mode.SUBTRACT)

    # Sketch40 → Boss-Extrude13 (add)
    with BuildSketch(Plane.XY.offset(76.5)):
        with Locations((13.558181818, 1.5)):
            Rectangle(SKETCH40_W, SKETCH40_H)
    extrude(amount=BOSS_EXTRUDE13_DEPTH)

    # Sketch41 → Cut-Extrude26 (cut)
    with BuildSketch(Plane(origin=(0, 3, 0), x_dir=(1, 0, 0), z_dir=(0, 1, 0))):
        with Locations((-6.691818182, -89.5)):
            Rectangle(SKETCH41_W, SKETCH41_H)
        with Locations((33.808181818, -89.5)):
            Rectangle(SKETCH41_W, SKETCH41_H)
        with Locations((13.558181818, -89.5)):
            Rectangle(SKETCH41_W, SKETCH41_H)
    extrude(amount=-CUT_EXTRUDE26_DEPTH, mode=Mode.SUBTRACT)

    # Sketch42 → Cut-Extrude30 (cut)
    with BuildSketch(Plane(origin=(0, 3, 0), x_dir=(1, 0, 0), z_dir=(0, 1, 0))):
        with Locations(Location((13.558181818, -2.5, 0), (0, 0, 270))):
            Circle(SKETCH42_R)
        with Locations(Location((30.558181818, 14.5, 0), (0, 0, 270))):
            Circle(SKETCH42_R_2)
        with Locations(Location((-3.441818182, 14.5, 0), (0, 0, 270))):
            Circle(SKETCH42_R_2)
        with Locations(Location((-3.441818182, -19.5, 0), (0, 0, 270))):
            Circle(SKETCH42_R_2)
        with Locations(Location((30.558181818, -19.5, 0), (0, 0, 270))):
            Circle(SKETCH42_R_2)
        Polygon((8.058181818, 14.75), (8.058181818, 11.194345135), (19.058181818, 11.194345135), (19.058181818, 14.75), (26.058181818, 14.75), (26.058181818, 7.75), (1.058181818, 7.75), (1.058181818, 14.75), align=None)
    extrude(amount=-CUT_EXTRUDE30_DEPTH, mode=Mode.SUBTRACT)


solid = part.part
